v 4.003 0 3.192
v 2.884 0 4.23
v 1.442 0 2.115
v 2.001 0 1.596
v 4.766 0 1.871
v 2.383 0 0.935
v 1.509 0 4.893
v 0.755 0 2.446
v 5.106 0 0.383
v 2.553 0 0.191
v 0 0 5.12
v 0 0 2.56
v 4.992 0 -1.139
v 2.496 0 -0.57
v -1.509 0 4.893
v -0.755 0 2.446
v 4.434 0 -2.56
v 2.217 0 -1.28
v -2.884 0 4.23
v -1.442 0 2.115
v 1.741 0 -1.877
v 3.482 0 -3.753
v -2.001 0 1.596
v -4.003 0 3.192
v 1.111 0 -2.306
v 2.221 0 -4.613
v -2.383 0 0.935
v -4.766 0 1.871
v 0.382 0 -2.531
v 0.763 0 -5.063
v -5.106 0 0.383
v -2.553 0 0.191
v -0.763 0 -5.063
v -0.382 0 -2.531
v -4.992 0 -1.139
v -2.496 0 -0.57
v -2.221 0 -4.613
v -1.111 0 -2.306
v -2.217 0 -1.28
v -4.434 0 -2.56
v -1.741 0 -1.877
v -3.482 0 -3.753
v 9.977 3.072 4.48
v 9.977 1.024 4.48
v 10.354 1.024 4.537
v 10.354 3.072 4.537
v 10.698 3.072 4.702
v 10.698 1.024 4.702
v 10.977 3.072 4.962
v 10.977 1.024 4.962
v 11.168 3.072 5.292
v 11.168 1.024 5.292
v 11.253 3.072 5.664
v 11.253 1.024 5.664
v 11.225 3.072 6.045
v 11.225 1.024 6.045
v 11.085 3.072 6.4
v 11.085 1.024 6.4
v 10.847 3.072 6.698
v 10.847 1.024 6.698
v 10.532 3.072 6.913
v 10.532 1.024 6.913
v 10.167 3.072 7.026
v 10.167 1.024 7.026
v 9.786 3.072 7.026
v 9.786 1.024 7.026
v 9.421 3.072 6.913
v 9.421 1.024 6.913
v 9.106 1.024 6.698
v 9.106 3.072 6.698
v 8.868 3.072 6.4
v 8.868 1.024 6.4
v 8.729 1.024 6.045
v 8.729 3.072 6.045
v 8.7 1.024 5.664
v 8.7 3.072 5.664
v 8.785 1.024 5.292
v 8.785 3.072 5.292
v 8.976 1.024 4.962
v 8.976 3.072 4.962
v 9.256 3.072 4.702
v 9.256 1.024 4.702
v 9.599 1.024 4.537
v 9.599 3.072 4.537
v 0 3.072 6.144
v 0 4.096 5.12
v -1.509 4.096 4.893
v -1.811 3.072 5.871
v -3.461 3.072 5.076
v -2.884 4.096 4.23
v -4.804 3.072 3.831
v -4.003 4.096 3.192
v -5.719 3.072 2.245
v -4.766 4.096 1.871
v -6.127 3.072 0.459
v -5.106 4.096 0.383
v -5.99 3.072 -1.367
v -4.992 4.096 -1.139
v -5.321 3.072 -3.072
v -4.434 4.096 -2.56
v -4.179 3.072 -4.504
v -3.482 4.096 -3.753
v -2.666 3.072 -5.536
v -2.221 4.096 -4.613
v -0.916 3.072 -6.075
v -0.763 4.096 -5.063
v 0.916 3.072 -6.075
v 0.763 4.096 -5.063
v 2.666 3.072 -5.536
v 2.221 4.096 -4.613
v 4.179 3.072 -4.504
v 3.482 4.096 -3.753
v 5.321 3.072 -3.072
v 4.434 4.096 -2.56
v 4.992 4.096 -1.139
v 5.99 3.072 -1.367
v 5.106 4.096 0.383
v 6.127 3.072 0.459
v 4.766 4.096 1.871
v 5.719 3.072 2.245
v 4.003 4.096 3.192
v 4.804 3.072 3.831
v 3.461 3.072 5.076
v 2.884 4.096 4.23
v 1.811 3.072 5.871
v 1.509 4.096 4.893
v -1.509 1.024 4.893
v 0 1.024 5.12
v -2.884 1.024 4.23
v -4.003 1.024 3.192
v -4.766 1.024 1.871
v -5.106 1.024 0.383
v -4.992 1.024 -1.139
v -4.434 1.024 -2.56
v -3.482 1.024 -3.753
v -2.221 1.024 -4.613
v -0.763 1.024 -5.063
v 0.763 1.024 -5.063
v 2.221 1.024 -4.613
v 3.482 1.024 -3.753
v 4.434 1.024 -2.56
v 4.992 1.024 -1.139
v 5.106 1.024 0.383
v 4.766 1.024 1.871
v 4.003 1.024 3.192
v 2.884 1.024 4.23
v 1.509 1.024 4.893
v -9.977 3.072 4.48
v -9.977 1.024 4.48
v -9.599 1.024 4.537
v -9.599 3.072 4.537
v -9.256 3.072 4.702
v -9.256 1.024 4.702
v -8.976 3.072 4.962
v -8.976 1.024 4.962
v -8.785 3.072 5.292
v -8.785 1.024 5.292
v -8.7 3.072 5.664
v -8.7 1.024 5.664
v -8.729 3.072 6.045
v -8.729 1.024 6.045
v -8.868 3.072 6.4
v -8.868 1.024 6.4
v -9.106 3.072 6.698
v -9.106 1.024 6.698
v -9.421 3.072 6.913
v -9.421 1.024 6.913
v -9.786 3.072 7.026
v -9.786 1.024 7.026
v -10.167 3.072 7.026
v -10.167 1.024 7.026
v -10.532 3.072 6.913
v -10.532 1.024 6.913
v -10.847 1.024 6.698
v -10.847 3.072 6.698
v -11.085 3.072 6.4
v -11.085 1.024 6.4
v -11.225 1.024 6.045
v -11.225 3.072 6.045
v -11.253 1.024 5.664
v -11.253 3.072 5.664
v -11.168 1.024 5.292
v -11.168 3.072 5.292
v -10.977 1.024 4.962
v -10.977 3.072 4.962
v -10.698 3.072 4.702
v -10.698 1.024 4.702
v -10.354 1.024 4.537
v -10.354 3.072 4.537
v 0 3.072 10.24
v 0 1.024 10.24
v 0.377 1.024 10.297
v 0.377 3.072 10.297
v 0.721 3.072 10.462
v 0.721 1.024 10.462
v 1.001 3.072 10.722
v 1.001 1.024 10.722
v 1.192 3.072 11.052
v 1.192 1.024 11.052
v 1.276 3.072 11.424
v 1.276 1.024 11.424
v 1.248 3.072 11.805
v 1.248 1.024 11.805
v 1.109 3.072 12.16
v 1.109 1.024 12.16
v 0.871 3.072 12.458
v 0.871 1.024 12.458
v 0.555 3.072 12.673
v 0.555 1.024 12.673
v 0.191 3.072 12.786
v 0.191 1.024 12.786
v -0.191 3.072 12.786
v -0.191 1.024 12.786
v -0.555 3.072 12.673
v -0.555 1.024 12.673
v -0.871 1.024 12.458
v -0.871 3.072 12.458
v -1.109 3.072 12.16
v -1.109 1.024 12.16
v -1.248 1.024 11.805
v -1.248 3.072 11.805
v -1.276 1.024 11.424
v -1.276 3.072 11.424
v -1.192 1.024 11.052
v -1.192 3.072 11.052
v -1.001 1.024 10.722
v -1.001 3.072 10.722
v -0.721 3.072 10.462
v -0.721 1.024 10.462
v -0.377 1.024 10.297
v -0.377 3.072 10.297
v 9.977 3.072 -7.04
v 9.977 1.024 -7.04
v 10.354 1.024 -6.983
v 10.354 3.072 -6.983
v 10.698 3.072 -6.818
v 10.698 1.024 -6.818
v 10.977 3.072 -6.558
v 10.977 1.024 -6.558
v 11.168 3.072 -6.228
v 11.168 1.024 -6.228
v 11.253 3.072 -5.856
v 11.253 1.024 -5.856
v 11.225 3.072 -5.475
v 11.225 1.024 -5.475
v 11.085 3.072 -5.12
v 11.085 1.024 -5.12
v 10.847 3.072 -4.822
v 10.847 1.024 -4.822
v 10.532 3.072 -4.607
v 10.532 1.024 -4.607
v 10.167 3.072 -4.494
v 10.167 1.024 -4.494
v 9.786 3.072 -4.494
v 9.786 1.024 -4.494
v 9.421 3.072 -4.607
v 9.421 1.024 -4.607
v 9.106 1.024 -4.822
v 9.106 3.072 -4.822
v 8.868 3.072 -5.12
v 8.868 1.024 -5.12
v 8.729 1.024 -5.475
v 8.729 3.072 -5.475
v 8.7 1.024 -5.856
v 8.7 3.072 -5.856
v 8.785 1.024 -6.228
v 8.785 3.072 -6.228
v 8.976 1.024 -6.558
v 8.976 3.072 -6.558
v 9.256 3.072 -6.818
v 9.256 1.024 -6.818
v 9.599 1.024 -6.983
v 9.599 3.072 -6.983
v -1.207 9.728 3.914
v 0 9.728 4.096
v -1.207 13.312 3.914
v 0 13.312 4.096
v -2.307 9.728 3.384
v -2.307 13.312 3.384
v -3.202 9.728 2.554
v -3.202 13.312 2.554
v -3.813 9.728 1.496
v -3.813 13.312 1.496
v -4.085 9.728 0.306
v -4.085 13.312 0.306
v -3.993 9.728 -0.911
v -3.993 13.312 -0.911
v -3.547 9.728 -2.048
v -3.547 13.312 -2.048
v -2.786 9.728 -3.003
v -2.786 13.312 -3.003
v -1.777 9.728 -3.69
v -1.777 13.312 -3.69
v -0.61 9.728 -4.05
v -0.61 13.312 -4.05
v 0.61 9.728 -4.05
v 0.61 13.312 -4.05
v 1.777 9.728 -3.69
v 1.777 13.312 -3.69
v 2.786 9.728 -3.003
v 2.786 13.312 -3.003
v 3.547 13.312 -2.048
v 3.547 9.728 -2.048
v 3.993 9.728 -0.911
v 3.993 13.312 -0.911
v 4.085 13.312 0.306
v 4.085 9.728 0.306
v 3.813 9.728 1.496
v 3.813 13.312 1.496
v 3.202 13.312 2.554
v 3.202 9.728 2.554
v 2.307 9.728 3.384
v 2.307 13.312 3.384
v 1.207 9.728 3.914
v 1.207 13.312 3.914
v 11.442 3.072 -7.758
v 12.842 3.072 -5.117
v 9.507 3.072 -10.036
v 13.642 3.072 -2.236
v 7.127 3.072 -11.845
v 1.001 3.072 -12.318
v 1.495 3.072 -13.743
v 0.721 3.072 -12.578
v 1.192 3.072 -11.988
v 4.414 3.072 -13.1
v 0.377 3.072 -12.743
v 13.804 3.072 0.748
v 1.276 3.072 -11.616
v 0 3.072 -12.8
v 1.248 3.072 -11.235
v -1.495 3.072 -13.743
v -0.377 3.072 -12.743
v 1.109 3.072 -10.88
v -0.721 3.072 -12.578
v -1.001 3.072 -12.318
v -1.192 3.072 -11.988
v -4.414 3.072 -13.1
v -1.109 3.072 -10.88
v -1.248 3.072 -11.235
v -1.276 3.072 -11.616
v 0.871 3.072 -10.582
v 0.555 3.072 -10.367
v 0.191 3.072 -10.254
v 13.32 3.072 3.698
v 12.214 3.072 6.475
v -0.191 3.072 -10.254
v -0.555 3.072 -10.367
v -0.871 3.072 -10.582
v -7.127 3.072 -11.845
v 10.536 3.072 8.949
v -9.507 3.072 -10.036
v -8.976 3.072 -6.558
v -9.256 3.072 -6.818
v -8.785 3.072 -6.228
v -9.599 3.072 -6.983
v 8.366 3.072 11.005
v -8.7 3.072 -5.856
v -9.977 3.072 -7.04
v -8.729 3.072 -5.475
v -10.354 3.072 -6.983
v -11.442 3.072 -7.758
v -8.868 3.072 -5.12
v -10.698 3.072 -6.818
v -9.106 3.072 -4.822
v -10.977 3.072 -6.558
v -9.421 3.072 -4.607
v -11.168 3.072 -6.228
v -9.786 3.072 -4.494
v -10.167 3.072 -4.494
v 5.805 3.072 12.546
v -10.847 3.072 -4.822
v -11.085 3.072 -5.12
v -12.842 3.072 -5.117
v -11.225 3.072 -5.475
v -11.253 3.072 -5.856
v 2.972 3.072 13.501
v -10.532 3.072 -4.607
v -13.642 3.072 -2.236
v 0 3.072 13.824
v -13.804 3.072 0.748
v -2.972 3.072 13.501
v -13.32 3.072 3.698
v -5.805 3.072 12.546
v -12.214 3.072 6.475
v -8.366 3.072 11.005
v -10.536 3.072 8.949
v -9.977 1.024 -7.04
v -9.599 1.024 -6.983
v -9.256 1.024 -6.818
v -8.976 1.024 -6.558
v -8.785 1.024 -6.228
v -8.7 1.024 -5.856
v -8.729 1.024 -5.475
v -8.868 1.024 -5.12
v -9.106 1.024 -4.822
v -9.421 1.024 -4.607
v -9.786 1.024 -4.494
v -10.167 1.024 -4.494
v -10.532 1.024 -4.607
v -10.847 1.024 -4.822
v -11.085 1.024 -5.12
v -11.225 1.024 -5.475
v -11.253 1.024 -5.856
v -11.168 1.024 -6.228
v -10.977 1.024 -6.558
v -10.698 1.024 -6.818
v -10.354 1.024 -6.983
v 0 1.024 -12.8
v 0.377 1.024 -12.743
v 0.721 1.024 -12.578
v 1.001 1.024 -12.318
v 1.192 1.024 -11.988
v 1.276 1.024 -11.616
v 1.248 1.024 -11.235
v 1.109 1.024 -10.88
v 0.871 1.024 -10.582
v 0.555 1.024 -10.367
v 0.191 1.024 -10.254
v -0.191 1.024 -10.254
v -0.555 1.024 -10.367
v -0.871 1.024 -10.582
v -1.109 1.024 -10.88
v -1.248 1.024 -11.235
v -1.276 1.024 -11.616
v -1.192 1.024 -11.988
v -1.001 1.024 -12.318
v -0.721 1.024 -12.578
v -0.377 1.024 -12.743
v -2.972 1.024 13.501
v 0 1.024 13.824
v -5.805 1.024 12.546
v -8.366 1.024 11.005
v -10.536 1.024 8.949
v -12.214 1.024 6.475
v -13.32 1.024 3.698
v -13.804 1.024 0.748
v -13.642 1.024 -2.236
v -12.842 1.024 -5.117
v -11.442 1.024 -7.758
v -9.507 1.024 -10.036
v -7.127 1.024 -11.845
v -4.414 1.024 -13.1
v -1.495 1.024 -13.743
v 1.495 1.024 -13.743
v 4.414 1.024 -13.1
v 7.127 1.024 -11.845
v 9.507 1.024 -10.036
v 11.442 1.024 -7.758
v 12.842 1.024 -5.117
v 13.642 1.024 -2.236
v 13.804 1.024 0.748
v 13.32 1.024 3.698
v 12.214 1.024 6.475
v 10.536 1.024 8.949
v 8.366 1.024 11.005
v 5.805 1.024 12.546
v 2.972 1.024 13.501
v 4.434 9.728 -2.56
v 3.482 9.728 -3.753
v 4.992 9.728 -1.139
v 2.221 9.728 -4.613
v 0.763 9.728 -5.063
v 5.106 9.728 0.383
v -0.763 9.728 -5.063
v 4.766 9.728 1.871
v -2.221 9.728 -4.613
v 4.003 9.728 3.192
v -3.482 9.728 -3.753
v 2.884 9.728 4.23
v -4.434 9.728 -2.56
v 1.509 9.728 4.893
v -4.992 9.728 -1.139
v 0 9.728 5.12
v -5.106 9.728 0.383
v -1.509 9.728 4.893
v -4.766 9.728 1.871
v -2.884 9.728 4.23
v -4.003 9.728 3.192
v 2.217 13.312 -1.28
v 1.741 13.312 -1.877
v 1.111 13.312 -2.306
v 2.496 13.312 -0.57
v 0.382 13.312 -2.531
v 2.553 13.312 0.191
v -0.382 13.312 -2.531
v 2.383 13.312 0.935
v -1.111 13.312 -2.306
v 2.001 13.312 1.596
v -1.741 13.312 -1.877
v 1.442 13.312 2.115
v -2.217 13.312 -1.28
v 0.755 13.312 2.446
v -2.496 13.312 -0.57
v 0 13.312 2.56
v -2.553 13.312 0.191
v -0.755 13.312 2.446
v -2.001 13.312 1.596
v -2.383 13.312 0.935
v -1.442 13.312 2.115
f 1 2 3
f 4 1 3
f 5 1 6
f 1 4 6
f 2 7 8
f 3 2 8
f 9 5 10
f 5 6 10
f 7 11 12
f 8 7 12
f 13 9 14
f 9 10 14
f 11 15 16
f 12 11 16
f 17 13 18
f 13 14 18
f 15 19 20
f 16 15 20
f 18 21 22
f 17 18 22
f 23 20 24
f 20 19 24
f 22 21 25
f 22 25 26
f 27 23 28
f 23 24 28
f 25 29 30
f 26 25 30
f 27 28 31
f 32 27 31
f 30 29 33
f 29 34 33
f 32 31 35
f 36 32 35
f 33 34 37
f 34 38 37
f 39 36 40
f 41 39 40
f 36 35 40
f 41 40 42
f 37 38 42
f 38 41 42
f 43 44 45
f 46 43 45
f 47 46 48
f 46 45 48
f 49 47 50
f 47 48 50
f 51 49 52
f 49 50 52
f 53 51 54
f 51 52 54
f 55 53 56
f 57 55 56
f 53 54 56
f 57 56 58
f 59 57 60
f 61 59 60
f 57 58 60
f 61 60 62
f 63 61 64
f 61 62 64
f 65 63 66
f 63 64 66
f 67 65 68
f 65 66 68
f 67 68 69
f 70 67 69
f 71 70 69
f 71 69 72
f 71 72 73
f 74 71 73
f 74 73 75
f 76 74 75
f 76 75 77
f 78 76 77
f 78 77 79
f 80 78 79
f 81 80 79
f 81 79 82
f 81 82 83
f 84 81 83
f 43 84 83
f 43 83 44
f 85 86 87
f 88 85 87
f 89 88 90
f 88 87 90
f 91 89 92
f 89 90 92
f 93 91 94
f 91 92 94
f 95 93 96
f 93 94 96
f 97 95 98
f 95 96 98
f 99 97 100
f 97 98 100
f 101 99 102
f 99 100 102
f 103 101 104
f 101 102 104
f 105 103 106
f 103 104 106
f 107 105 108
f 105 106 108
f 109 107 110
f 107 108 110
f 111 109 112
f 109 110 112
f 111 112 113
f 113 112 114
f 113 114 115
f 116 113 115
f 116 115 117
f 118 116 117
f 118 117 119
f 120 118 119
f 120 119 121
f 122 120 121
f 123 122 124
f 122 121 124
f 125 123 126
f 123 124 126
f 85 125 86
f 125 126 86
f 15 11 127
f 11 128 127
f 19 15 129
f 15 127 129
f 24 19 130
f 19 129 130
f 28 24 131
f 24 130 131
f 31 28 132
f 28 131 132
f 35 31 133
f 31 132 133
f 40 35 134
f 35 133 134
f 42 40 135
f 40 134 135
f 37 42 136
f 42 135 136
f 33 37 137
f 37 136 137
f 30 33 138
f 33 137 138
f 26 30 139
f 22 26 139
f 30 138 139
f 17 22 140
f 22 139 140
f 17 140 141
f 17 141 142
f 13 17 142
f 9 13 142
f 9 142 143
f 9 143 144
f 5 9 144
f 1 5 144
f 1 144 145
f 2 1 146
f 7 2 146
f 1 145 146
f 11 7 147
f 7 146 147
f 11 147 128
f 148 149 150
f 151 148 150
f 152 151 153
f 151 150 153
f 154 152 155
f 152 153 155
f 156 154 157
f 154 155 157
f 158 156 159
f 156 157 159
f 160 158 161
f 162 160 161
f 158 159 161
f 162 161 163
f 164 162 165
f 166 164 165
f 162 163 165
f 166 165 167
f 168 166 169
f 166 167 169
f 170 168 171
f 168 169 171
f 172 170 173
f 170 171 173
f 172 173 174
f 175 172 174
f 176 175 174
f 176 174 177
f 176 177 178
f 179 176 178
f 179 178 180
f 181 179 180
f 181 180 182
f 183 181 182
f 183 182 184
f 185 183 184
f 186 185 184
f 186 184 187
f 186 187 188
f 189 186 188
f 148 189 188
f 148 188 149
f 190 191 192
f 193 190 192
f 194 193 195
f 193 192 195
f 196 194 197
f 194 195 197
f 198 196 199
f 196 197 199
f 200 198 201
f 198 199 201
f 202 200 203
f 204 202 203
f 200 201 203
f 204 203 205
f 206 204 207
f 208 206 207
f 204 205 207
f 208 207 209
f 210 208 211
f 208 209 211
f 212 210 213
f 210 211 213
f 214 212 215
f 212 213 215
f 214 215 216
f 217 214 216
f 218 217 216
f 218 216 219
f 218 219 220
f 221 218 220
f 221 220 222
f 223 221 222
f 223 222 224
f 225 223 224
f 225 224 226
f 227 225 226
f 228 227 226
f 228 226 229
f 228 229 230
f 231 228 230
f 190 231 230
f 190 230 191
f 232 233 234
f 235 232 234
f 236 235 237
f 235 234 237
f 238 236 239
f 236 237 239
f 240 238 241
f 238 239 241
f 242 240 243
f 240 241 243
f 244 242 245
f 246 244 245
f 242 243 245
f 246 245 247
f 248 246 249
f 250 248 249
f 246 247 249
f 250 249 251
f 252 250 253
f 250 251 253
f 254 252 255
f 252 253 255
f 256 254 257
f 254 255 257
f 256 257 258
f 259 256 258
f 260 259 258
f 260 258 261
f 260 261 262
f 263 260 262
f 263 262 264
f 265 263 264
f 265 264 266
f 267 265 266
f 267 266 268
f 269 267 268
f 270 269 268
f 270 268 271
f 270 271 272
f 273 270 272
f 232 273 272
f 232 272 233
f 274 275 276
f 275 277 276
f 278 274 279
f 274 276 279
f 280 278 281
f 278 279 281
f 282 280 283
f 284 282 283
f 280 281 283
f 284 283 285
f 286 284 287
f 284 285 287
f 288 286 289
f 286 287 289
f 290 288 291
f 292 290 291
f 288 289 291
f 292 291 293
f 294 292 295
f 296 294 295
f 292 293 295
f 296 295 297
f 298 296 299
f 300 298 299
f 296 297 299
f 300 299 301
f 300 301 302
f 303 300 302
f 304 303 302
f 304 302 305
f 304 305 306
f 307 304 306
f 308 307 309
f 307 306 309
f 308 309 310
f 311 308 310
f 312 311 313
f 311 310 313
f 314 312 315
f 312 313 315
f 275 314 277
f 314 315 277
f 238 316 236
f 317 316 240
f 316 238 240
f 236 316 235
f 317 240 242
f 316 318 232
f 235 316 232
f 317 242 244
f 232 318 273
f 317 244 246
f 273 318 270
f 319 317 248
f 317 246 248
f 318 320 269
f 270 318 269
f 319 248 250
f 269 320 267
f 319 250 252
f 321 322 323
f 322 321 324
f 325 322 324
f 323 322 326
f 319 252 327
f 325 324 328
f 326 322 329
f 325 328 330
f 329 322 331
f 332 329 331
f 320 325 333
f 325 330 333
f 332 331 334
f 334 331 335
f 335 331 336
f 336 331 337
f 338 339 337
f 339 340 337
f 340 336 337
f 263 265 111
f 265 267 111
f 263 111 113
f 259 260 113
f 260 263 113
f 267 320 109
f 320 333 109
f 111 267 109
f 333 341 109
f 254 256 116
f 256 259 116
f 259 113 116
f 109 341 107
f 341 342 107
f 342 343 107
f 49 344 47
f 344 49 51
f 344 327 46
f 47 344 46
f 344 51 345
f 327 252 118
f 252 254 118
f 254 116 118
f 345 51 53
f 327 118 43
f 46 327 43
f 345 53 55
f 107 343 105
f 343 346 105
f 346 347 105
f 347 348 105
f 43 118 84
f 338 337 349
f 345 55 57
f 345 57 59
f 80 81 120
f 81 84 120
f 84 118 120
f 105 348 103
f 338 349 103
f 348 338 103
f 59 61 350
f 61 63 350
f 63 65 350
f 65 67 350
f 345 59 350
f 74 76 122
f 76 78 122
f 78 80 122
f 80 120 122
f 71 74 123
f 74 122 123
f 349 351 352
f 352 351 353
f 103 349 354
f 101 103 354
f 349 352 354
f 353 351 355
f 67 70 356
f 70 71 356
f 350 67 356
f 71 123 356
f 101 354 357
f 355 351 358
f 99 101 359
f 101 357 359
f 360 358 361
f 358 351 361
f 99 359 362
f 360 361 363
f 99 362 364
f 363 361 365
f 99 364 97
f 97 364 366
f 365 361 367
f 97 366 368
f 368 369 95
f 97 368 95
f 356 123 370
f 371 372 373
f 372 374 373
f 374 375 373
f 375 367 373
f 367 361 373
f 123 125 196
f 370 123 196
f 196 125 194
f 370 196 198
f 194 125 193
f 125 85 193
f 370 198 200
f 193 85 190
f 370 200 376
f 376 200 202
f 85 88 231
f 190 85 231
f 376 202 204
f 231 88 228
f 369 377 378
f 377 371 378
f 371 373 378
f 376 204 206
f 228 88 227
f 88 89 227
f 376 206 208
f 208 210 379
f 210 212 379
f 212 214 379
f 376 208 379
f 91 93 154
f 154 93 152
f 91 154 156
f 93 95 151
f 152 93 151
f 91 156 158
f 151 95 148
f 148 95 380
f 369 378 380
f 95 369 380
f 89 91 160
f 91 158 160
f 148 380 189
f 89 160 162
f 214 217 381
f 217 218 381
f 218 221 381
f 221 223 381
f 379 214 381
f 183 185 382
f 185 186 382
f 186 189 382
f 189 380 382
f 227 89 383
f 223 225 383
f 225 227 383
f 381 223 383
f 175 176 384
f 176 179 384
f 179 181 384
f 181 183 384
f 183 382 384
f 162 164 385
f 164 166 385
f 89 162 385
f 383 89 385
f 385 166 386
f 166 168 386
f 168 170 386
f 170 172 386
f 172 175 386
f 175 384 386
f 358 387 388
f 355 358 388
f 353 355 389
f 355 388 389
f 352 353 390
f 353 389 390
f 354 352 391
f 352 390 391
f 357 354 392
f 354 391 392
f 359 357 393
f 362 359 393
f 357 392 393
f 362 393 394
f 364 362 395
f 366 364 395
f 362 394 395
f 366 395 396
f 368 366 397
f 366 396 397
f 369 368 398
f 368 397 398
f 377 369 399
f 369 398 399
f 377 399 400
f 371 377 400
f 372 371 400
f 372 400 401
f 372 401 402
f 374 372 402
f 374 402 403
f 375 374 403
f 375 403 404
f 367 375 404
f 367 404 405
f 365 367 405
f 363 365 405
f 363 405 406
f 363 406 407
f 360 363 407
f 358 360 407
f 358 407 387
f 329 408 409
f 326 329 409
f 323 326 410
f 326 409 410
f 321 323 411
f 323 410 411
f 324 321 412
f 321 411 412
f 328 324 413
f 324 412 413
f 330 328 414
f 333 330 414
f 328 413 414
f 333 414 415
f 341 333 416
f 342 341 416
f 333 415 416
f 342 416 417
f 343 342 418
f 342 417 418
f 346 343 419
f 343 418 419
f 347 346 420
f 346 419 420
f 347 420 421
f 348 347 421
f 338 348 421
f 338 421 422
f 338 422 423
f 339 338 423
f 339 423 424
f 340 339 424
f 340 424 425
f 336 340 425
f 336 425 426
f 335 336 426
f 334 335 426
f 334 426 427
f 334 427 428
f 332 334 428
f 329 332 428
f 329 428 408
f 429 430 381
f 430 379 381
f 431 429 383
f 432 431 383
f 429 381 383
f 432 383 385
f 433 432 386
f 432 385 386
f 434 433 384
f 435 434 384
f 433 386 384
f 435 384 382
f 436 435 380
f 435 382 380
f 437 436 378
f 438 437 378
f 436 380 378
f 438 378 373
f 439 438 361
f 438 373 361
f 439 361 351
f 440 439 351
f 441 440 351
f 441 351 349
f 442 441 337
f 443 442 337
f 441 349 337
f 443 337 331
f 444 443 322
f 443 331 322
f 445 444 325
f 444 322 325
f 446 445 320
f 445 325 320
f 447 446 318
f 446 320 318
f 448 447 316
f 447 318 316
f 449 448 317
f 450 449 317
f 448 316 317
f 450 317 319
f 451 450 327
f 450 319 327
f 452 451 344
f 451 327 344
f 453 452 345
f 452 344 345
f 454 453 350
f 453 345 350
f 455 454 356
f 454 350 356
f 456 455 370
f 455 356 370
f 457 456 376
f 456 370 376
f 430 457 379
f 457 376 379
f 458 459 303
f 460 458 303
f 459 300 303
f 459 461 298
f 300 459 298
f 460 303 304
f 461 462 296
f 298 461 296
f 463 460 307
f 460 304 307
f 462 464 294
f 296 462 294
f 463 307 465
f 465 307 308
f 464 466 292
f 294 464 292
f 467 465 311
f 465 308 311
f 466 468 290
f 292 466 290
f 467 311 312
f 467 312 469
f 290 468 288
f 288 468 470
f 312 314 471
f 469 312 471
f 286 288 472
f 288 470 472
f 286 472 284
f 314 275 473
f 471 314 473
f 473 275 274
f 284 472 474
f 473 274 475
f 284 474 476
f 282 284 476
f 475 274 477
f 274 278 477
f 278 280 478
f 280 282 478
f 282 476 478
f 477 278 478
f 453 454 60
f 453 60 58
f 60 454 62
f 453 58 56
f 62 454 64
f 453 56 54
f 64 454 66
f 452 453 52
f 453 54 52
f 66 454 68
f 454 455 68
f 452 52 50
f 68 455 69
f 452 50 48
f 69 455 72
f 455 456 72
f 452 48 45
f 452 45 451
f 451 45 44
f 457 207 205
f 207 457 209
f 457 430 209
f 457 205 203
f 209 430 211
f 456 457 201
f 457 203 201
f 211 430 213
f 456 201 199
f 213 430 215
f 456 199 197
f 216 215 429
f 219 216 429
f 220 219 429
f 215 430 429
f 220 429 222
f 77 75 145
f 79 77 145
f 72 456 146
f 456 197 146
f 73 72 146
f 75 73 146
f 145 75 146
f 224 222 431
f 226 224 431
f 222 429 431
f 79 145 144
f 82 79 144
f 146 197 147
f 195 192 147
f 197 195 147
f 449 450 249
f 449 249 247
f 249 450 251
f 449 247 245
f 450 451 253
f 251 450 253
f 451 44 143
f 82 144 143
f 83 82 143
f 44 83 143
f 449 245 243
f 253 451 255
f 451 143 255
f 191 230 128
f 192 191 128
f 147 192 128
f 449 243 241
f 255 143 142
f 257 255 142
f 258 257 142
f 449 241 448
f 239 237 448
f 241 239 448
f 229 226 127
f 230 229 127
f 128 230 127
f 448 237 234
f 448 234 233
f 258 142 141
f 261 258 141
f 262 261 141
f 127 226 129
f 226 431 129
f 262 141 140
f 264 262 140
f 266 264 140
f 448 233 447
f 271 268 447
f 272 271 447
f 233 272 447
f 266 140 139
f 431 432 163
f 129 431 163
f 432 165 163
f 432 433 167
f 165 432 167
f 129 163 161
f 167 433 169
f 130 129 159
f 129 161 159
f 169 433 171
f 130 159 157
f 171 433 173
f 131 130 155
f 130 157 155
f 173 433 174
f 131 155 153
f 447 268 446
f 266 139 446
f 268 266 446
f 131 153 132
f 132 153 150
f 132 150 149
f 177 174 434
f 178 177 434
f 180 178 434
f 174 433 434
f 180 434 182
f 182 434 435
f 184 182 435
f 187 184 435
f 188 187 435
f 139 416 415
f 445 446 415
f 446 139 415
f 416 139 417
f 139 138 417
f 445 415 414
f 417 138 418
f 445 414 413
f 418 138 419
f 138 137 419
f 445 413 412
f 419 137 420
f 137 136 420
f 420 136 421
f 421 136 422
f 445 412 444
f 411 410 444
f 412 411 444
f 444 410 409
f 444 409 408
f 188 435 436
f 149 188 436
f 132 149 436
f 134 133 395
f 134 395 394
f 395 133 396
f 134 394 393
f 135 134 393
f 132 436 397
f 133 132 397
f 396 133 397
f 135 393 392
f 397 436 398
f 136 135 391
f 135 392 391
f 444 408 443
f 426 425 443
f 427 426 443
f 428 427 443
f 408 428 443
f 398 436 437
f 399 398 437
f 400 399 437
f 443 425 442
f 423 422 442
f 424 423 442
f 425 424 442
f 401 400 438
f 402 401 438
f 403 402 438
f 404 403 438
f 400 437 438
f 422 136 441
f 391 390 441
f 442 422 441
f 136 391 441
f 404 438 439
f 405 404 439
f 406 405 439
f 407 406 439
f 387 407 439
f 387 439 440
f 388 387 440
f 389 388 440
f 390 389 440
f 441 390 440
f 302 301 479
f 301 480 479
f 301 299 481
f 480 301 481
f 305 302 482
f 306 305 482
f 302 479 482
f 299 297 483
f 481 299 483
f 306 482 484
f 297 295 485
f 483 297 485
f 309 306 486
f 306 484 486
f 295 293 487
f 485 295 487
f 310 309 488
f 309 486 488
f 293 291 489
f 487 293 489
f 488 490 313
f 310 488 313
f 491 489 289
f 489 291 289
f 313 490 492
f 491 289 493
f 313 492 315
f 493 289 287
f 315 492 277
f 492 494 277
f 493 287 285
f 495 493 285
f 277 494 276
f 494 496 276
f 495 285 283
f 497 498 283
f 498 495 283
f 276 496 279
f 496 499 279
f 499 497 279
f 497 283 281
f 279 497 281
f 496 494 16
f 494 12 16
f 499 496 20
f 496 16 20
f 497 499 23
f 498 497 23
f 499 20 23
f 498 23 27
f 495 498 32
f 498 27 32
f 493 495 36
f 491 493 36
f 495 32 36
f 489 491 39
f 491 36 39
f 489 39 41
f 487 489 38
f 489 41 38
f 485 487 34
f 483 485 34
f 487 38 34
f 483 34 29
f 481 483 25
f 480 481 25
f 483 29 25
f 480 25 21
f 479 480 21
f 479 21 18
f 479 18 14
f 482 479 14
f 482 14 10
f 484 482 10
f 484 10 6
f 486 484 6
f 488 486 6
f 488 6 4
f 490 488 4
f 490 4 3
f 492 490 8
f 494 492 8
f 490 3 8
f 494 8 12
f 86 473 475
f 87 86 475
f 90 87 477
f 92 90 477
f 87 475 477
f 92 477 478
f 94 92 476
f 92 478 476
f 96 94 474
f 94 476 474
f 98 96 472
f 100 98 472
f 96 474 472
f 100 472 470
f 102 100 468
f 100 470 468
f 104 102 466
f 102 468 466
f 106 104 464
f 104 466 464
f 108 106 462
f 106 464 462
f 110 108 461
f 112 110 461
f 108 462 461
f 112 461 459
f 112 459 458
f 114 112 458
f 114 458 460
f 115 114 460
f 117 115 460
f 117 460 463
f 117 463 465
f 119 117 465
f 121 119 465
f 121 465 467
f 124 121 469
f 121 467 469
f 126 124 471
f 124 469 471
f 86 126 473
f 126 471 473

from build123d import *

# Parameters (mm, degrees)
SKETCH_2_R          = 2.5
CUT_EXTRUDE_2_DEPTH = 10
CHAMFER_1_SIZE      = 2
SCALE_1_SCALE       = 0.8
SCALE_2_SCALE       = 0.8
SCALE_3_SCALE       = 0.8


with BuildPart() as part:
    # 草图1 → 旋转1 (revolve)
    with BuildSketch(Plane.XY, mode=Mode.PRIVATE) as revolve_1_sk:
        Polygon((-10, 2), (-27, 2), (-27, 6), (-10, 6), (-10, 19), (-8, 19), (-8, 26), (-5, 26), (-5, 0), (-10, 0), align=None)
    revolve(revolve_1_sk.sketch.rotate(Axis((0, 0, 0), (0, -1, 0)), 270), axis=Axis((0, 0, 0), (0, -1, 0)))

    # 草图2 → 切除-拉伸2 (cut)
    with BuildSketch(Plane.XZ.offset(-2)):
        with Locations(Location((0, 22.5, 0), (0, 0, 270))):
            Circle(SKETCH_2_R)
        with Locations(Location((19.485571585, 11.25, 0), (0, 0, 270))):
            Circle(SKETCH_2_R)
        with Locations(Location((19.485571585, -11.25, 0), (0, 0, 270))):
            Circle(SKETCH_2_R)
        with Locations(Location((0, -22.5, 0), (0, 0, 270))):
            Circle(SKETCH_2_R)
        with Locations(Location((-19.485571585, -11.25, 0), (0, 0, 270))):
            Circle(SKETCH_2_R)
        with Locations(Location((-19.485571585, 11.25, 0), (0, 0, 270))):
            Circle(SKETCH_2_R)
    extrude(amount=-CUT_EXTRUDE_2_DEPTH, mode=Mode.SUBTRACT)

    # 倒角1
    chamfer_1_edges = [part.edges().sort_by_distance(p)[0] for p in [
        (0, 6, -10),
    ]]
    chamfer(chamfer_1_edges, length=CHAMFER_1_SIZE)


with BuildPart() as part_1:
    # 缩放比例1: scaled about (0, 0, 0)
    add(part.part.scale(SCALE_1_SCALE))


with BuildPart() as part_2:
    # 缩放比例2: scaled about (0, 0, 0)
    add(part_1.part.scale(SCALE_2_SCALE))


with BuildPart() as part_3:
    # 缩放比例3: scaled about (0, 0, 0)
    add(part_2.part.scale(SCALE_3_SCALE))


solid = part_3.part
